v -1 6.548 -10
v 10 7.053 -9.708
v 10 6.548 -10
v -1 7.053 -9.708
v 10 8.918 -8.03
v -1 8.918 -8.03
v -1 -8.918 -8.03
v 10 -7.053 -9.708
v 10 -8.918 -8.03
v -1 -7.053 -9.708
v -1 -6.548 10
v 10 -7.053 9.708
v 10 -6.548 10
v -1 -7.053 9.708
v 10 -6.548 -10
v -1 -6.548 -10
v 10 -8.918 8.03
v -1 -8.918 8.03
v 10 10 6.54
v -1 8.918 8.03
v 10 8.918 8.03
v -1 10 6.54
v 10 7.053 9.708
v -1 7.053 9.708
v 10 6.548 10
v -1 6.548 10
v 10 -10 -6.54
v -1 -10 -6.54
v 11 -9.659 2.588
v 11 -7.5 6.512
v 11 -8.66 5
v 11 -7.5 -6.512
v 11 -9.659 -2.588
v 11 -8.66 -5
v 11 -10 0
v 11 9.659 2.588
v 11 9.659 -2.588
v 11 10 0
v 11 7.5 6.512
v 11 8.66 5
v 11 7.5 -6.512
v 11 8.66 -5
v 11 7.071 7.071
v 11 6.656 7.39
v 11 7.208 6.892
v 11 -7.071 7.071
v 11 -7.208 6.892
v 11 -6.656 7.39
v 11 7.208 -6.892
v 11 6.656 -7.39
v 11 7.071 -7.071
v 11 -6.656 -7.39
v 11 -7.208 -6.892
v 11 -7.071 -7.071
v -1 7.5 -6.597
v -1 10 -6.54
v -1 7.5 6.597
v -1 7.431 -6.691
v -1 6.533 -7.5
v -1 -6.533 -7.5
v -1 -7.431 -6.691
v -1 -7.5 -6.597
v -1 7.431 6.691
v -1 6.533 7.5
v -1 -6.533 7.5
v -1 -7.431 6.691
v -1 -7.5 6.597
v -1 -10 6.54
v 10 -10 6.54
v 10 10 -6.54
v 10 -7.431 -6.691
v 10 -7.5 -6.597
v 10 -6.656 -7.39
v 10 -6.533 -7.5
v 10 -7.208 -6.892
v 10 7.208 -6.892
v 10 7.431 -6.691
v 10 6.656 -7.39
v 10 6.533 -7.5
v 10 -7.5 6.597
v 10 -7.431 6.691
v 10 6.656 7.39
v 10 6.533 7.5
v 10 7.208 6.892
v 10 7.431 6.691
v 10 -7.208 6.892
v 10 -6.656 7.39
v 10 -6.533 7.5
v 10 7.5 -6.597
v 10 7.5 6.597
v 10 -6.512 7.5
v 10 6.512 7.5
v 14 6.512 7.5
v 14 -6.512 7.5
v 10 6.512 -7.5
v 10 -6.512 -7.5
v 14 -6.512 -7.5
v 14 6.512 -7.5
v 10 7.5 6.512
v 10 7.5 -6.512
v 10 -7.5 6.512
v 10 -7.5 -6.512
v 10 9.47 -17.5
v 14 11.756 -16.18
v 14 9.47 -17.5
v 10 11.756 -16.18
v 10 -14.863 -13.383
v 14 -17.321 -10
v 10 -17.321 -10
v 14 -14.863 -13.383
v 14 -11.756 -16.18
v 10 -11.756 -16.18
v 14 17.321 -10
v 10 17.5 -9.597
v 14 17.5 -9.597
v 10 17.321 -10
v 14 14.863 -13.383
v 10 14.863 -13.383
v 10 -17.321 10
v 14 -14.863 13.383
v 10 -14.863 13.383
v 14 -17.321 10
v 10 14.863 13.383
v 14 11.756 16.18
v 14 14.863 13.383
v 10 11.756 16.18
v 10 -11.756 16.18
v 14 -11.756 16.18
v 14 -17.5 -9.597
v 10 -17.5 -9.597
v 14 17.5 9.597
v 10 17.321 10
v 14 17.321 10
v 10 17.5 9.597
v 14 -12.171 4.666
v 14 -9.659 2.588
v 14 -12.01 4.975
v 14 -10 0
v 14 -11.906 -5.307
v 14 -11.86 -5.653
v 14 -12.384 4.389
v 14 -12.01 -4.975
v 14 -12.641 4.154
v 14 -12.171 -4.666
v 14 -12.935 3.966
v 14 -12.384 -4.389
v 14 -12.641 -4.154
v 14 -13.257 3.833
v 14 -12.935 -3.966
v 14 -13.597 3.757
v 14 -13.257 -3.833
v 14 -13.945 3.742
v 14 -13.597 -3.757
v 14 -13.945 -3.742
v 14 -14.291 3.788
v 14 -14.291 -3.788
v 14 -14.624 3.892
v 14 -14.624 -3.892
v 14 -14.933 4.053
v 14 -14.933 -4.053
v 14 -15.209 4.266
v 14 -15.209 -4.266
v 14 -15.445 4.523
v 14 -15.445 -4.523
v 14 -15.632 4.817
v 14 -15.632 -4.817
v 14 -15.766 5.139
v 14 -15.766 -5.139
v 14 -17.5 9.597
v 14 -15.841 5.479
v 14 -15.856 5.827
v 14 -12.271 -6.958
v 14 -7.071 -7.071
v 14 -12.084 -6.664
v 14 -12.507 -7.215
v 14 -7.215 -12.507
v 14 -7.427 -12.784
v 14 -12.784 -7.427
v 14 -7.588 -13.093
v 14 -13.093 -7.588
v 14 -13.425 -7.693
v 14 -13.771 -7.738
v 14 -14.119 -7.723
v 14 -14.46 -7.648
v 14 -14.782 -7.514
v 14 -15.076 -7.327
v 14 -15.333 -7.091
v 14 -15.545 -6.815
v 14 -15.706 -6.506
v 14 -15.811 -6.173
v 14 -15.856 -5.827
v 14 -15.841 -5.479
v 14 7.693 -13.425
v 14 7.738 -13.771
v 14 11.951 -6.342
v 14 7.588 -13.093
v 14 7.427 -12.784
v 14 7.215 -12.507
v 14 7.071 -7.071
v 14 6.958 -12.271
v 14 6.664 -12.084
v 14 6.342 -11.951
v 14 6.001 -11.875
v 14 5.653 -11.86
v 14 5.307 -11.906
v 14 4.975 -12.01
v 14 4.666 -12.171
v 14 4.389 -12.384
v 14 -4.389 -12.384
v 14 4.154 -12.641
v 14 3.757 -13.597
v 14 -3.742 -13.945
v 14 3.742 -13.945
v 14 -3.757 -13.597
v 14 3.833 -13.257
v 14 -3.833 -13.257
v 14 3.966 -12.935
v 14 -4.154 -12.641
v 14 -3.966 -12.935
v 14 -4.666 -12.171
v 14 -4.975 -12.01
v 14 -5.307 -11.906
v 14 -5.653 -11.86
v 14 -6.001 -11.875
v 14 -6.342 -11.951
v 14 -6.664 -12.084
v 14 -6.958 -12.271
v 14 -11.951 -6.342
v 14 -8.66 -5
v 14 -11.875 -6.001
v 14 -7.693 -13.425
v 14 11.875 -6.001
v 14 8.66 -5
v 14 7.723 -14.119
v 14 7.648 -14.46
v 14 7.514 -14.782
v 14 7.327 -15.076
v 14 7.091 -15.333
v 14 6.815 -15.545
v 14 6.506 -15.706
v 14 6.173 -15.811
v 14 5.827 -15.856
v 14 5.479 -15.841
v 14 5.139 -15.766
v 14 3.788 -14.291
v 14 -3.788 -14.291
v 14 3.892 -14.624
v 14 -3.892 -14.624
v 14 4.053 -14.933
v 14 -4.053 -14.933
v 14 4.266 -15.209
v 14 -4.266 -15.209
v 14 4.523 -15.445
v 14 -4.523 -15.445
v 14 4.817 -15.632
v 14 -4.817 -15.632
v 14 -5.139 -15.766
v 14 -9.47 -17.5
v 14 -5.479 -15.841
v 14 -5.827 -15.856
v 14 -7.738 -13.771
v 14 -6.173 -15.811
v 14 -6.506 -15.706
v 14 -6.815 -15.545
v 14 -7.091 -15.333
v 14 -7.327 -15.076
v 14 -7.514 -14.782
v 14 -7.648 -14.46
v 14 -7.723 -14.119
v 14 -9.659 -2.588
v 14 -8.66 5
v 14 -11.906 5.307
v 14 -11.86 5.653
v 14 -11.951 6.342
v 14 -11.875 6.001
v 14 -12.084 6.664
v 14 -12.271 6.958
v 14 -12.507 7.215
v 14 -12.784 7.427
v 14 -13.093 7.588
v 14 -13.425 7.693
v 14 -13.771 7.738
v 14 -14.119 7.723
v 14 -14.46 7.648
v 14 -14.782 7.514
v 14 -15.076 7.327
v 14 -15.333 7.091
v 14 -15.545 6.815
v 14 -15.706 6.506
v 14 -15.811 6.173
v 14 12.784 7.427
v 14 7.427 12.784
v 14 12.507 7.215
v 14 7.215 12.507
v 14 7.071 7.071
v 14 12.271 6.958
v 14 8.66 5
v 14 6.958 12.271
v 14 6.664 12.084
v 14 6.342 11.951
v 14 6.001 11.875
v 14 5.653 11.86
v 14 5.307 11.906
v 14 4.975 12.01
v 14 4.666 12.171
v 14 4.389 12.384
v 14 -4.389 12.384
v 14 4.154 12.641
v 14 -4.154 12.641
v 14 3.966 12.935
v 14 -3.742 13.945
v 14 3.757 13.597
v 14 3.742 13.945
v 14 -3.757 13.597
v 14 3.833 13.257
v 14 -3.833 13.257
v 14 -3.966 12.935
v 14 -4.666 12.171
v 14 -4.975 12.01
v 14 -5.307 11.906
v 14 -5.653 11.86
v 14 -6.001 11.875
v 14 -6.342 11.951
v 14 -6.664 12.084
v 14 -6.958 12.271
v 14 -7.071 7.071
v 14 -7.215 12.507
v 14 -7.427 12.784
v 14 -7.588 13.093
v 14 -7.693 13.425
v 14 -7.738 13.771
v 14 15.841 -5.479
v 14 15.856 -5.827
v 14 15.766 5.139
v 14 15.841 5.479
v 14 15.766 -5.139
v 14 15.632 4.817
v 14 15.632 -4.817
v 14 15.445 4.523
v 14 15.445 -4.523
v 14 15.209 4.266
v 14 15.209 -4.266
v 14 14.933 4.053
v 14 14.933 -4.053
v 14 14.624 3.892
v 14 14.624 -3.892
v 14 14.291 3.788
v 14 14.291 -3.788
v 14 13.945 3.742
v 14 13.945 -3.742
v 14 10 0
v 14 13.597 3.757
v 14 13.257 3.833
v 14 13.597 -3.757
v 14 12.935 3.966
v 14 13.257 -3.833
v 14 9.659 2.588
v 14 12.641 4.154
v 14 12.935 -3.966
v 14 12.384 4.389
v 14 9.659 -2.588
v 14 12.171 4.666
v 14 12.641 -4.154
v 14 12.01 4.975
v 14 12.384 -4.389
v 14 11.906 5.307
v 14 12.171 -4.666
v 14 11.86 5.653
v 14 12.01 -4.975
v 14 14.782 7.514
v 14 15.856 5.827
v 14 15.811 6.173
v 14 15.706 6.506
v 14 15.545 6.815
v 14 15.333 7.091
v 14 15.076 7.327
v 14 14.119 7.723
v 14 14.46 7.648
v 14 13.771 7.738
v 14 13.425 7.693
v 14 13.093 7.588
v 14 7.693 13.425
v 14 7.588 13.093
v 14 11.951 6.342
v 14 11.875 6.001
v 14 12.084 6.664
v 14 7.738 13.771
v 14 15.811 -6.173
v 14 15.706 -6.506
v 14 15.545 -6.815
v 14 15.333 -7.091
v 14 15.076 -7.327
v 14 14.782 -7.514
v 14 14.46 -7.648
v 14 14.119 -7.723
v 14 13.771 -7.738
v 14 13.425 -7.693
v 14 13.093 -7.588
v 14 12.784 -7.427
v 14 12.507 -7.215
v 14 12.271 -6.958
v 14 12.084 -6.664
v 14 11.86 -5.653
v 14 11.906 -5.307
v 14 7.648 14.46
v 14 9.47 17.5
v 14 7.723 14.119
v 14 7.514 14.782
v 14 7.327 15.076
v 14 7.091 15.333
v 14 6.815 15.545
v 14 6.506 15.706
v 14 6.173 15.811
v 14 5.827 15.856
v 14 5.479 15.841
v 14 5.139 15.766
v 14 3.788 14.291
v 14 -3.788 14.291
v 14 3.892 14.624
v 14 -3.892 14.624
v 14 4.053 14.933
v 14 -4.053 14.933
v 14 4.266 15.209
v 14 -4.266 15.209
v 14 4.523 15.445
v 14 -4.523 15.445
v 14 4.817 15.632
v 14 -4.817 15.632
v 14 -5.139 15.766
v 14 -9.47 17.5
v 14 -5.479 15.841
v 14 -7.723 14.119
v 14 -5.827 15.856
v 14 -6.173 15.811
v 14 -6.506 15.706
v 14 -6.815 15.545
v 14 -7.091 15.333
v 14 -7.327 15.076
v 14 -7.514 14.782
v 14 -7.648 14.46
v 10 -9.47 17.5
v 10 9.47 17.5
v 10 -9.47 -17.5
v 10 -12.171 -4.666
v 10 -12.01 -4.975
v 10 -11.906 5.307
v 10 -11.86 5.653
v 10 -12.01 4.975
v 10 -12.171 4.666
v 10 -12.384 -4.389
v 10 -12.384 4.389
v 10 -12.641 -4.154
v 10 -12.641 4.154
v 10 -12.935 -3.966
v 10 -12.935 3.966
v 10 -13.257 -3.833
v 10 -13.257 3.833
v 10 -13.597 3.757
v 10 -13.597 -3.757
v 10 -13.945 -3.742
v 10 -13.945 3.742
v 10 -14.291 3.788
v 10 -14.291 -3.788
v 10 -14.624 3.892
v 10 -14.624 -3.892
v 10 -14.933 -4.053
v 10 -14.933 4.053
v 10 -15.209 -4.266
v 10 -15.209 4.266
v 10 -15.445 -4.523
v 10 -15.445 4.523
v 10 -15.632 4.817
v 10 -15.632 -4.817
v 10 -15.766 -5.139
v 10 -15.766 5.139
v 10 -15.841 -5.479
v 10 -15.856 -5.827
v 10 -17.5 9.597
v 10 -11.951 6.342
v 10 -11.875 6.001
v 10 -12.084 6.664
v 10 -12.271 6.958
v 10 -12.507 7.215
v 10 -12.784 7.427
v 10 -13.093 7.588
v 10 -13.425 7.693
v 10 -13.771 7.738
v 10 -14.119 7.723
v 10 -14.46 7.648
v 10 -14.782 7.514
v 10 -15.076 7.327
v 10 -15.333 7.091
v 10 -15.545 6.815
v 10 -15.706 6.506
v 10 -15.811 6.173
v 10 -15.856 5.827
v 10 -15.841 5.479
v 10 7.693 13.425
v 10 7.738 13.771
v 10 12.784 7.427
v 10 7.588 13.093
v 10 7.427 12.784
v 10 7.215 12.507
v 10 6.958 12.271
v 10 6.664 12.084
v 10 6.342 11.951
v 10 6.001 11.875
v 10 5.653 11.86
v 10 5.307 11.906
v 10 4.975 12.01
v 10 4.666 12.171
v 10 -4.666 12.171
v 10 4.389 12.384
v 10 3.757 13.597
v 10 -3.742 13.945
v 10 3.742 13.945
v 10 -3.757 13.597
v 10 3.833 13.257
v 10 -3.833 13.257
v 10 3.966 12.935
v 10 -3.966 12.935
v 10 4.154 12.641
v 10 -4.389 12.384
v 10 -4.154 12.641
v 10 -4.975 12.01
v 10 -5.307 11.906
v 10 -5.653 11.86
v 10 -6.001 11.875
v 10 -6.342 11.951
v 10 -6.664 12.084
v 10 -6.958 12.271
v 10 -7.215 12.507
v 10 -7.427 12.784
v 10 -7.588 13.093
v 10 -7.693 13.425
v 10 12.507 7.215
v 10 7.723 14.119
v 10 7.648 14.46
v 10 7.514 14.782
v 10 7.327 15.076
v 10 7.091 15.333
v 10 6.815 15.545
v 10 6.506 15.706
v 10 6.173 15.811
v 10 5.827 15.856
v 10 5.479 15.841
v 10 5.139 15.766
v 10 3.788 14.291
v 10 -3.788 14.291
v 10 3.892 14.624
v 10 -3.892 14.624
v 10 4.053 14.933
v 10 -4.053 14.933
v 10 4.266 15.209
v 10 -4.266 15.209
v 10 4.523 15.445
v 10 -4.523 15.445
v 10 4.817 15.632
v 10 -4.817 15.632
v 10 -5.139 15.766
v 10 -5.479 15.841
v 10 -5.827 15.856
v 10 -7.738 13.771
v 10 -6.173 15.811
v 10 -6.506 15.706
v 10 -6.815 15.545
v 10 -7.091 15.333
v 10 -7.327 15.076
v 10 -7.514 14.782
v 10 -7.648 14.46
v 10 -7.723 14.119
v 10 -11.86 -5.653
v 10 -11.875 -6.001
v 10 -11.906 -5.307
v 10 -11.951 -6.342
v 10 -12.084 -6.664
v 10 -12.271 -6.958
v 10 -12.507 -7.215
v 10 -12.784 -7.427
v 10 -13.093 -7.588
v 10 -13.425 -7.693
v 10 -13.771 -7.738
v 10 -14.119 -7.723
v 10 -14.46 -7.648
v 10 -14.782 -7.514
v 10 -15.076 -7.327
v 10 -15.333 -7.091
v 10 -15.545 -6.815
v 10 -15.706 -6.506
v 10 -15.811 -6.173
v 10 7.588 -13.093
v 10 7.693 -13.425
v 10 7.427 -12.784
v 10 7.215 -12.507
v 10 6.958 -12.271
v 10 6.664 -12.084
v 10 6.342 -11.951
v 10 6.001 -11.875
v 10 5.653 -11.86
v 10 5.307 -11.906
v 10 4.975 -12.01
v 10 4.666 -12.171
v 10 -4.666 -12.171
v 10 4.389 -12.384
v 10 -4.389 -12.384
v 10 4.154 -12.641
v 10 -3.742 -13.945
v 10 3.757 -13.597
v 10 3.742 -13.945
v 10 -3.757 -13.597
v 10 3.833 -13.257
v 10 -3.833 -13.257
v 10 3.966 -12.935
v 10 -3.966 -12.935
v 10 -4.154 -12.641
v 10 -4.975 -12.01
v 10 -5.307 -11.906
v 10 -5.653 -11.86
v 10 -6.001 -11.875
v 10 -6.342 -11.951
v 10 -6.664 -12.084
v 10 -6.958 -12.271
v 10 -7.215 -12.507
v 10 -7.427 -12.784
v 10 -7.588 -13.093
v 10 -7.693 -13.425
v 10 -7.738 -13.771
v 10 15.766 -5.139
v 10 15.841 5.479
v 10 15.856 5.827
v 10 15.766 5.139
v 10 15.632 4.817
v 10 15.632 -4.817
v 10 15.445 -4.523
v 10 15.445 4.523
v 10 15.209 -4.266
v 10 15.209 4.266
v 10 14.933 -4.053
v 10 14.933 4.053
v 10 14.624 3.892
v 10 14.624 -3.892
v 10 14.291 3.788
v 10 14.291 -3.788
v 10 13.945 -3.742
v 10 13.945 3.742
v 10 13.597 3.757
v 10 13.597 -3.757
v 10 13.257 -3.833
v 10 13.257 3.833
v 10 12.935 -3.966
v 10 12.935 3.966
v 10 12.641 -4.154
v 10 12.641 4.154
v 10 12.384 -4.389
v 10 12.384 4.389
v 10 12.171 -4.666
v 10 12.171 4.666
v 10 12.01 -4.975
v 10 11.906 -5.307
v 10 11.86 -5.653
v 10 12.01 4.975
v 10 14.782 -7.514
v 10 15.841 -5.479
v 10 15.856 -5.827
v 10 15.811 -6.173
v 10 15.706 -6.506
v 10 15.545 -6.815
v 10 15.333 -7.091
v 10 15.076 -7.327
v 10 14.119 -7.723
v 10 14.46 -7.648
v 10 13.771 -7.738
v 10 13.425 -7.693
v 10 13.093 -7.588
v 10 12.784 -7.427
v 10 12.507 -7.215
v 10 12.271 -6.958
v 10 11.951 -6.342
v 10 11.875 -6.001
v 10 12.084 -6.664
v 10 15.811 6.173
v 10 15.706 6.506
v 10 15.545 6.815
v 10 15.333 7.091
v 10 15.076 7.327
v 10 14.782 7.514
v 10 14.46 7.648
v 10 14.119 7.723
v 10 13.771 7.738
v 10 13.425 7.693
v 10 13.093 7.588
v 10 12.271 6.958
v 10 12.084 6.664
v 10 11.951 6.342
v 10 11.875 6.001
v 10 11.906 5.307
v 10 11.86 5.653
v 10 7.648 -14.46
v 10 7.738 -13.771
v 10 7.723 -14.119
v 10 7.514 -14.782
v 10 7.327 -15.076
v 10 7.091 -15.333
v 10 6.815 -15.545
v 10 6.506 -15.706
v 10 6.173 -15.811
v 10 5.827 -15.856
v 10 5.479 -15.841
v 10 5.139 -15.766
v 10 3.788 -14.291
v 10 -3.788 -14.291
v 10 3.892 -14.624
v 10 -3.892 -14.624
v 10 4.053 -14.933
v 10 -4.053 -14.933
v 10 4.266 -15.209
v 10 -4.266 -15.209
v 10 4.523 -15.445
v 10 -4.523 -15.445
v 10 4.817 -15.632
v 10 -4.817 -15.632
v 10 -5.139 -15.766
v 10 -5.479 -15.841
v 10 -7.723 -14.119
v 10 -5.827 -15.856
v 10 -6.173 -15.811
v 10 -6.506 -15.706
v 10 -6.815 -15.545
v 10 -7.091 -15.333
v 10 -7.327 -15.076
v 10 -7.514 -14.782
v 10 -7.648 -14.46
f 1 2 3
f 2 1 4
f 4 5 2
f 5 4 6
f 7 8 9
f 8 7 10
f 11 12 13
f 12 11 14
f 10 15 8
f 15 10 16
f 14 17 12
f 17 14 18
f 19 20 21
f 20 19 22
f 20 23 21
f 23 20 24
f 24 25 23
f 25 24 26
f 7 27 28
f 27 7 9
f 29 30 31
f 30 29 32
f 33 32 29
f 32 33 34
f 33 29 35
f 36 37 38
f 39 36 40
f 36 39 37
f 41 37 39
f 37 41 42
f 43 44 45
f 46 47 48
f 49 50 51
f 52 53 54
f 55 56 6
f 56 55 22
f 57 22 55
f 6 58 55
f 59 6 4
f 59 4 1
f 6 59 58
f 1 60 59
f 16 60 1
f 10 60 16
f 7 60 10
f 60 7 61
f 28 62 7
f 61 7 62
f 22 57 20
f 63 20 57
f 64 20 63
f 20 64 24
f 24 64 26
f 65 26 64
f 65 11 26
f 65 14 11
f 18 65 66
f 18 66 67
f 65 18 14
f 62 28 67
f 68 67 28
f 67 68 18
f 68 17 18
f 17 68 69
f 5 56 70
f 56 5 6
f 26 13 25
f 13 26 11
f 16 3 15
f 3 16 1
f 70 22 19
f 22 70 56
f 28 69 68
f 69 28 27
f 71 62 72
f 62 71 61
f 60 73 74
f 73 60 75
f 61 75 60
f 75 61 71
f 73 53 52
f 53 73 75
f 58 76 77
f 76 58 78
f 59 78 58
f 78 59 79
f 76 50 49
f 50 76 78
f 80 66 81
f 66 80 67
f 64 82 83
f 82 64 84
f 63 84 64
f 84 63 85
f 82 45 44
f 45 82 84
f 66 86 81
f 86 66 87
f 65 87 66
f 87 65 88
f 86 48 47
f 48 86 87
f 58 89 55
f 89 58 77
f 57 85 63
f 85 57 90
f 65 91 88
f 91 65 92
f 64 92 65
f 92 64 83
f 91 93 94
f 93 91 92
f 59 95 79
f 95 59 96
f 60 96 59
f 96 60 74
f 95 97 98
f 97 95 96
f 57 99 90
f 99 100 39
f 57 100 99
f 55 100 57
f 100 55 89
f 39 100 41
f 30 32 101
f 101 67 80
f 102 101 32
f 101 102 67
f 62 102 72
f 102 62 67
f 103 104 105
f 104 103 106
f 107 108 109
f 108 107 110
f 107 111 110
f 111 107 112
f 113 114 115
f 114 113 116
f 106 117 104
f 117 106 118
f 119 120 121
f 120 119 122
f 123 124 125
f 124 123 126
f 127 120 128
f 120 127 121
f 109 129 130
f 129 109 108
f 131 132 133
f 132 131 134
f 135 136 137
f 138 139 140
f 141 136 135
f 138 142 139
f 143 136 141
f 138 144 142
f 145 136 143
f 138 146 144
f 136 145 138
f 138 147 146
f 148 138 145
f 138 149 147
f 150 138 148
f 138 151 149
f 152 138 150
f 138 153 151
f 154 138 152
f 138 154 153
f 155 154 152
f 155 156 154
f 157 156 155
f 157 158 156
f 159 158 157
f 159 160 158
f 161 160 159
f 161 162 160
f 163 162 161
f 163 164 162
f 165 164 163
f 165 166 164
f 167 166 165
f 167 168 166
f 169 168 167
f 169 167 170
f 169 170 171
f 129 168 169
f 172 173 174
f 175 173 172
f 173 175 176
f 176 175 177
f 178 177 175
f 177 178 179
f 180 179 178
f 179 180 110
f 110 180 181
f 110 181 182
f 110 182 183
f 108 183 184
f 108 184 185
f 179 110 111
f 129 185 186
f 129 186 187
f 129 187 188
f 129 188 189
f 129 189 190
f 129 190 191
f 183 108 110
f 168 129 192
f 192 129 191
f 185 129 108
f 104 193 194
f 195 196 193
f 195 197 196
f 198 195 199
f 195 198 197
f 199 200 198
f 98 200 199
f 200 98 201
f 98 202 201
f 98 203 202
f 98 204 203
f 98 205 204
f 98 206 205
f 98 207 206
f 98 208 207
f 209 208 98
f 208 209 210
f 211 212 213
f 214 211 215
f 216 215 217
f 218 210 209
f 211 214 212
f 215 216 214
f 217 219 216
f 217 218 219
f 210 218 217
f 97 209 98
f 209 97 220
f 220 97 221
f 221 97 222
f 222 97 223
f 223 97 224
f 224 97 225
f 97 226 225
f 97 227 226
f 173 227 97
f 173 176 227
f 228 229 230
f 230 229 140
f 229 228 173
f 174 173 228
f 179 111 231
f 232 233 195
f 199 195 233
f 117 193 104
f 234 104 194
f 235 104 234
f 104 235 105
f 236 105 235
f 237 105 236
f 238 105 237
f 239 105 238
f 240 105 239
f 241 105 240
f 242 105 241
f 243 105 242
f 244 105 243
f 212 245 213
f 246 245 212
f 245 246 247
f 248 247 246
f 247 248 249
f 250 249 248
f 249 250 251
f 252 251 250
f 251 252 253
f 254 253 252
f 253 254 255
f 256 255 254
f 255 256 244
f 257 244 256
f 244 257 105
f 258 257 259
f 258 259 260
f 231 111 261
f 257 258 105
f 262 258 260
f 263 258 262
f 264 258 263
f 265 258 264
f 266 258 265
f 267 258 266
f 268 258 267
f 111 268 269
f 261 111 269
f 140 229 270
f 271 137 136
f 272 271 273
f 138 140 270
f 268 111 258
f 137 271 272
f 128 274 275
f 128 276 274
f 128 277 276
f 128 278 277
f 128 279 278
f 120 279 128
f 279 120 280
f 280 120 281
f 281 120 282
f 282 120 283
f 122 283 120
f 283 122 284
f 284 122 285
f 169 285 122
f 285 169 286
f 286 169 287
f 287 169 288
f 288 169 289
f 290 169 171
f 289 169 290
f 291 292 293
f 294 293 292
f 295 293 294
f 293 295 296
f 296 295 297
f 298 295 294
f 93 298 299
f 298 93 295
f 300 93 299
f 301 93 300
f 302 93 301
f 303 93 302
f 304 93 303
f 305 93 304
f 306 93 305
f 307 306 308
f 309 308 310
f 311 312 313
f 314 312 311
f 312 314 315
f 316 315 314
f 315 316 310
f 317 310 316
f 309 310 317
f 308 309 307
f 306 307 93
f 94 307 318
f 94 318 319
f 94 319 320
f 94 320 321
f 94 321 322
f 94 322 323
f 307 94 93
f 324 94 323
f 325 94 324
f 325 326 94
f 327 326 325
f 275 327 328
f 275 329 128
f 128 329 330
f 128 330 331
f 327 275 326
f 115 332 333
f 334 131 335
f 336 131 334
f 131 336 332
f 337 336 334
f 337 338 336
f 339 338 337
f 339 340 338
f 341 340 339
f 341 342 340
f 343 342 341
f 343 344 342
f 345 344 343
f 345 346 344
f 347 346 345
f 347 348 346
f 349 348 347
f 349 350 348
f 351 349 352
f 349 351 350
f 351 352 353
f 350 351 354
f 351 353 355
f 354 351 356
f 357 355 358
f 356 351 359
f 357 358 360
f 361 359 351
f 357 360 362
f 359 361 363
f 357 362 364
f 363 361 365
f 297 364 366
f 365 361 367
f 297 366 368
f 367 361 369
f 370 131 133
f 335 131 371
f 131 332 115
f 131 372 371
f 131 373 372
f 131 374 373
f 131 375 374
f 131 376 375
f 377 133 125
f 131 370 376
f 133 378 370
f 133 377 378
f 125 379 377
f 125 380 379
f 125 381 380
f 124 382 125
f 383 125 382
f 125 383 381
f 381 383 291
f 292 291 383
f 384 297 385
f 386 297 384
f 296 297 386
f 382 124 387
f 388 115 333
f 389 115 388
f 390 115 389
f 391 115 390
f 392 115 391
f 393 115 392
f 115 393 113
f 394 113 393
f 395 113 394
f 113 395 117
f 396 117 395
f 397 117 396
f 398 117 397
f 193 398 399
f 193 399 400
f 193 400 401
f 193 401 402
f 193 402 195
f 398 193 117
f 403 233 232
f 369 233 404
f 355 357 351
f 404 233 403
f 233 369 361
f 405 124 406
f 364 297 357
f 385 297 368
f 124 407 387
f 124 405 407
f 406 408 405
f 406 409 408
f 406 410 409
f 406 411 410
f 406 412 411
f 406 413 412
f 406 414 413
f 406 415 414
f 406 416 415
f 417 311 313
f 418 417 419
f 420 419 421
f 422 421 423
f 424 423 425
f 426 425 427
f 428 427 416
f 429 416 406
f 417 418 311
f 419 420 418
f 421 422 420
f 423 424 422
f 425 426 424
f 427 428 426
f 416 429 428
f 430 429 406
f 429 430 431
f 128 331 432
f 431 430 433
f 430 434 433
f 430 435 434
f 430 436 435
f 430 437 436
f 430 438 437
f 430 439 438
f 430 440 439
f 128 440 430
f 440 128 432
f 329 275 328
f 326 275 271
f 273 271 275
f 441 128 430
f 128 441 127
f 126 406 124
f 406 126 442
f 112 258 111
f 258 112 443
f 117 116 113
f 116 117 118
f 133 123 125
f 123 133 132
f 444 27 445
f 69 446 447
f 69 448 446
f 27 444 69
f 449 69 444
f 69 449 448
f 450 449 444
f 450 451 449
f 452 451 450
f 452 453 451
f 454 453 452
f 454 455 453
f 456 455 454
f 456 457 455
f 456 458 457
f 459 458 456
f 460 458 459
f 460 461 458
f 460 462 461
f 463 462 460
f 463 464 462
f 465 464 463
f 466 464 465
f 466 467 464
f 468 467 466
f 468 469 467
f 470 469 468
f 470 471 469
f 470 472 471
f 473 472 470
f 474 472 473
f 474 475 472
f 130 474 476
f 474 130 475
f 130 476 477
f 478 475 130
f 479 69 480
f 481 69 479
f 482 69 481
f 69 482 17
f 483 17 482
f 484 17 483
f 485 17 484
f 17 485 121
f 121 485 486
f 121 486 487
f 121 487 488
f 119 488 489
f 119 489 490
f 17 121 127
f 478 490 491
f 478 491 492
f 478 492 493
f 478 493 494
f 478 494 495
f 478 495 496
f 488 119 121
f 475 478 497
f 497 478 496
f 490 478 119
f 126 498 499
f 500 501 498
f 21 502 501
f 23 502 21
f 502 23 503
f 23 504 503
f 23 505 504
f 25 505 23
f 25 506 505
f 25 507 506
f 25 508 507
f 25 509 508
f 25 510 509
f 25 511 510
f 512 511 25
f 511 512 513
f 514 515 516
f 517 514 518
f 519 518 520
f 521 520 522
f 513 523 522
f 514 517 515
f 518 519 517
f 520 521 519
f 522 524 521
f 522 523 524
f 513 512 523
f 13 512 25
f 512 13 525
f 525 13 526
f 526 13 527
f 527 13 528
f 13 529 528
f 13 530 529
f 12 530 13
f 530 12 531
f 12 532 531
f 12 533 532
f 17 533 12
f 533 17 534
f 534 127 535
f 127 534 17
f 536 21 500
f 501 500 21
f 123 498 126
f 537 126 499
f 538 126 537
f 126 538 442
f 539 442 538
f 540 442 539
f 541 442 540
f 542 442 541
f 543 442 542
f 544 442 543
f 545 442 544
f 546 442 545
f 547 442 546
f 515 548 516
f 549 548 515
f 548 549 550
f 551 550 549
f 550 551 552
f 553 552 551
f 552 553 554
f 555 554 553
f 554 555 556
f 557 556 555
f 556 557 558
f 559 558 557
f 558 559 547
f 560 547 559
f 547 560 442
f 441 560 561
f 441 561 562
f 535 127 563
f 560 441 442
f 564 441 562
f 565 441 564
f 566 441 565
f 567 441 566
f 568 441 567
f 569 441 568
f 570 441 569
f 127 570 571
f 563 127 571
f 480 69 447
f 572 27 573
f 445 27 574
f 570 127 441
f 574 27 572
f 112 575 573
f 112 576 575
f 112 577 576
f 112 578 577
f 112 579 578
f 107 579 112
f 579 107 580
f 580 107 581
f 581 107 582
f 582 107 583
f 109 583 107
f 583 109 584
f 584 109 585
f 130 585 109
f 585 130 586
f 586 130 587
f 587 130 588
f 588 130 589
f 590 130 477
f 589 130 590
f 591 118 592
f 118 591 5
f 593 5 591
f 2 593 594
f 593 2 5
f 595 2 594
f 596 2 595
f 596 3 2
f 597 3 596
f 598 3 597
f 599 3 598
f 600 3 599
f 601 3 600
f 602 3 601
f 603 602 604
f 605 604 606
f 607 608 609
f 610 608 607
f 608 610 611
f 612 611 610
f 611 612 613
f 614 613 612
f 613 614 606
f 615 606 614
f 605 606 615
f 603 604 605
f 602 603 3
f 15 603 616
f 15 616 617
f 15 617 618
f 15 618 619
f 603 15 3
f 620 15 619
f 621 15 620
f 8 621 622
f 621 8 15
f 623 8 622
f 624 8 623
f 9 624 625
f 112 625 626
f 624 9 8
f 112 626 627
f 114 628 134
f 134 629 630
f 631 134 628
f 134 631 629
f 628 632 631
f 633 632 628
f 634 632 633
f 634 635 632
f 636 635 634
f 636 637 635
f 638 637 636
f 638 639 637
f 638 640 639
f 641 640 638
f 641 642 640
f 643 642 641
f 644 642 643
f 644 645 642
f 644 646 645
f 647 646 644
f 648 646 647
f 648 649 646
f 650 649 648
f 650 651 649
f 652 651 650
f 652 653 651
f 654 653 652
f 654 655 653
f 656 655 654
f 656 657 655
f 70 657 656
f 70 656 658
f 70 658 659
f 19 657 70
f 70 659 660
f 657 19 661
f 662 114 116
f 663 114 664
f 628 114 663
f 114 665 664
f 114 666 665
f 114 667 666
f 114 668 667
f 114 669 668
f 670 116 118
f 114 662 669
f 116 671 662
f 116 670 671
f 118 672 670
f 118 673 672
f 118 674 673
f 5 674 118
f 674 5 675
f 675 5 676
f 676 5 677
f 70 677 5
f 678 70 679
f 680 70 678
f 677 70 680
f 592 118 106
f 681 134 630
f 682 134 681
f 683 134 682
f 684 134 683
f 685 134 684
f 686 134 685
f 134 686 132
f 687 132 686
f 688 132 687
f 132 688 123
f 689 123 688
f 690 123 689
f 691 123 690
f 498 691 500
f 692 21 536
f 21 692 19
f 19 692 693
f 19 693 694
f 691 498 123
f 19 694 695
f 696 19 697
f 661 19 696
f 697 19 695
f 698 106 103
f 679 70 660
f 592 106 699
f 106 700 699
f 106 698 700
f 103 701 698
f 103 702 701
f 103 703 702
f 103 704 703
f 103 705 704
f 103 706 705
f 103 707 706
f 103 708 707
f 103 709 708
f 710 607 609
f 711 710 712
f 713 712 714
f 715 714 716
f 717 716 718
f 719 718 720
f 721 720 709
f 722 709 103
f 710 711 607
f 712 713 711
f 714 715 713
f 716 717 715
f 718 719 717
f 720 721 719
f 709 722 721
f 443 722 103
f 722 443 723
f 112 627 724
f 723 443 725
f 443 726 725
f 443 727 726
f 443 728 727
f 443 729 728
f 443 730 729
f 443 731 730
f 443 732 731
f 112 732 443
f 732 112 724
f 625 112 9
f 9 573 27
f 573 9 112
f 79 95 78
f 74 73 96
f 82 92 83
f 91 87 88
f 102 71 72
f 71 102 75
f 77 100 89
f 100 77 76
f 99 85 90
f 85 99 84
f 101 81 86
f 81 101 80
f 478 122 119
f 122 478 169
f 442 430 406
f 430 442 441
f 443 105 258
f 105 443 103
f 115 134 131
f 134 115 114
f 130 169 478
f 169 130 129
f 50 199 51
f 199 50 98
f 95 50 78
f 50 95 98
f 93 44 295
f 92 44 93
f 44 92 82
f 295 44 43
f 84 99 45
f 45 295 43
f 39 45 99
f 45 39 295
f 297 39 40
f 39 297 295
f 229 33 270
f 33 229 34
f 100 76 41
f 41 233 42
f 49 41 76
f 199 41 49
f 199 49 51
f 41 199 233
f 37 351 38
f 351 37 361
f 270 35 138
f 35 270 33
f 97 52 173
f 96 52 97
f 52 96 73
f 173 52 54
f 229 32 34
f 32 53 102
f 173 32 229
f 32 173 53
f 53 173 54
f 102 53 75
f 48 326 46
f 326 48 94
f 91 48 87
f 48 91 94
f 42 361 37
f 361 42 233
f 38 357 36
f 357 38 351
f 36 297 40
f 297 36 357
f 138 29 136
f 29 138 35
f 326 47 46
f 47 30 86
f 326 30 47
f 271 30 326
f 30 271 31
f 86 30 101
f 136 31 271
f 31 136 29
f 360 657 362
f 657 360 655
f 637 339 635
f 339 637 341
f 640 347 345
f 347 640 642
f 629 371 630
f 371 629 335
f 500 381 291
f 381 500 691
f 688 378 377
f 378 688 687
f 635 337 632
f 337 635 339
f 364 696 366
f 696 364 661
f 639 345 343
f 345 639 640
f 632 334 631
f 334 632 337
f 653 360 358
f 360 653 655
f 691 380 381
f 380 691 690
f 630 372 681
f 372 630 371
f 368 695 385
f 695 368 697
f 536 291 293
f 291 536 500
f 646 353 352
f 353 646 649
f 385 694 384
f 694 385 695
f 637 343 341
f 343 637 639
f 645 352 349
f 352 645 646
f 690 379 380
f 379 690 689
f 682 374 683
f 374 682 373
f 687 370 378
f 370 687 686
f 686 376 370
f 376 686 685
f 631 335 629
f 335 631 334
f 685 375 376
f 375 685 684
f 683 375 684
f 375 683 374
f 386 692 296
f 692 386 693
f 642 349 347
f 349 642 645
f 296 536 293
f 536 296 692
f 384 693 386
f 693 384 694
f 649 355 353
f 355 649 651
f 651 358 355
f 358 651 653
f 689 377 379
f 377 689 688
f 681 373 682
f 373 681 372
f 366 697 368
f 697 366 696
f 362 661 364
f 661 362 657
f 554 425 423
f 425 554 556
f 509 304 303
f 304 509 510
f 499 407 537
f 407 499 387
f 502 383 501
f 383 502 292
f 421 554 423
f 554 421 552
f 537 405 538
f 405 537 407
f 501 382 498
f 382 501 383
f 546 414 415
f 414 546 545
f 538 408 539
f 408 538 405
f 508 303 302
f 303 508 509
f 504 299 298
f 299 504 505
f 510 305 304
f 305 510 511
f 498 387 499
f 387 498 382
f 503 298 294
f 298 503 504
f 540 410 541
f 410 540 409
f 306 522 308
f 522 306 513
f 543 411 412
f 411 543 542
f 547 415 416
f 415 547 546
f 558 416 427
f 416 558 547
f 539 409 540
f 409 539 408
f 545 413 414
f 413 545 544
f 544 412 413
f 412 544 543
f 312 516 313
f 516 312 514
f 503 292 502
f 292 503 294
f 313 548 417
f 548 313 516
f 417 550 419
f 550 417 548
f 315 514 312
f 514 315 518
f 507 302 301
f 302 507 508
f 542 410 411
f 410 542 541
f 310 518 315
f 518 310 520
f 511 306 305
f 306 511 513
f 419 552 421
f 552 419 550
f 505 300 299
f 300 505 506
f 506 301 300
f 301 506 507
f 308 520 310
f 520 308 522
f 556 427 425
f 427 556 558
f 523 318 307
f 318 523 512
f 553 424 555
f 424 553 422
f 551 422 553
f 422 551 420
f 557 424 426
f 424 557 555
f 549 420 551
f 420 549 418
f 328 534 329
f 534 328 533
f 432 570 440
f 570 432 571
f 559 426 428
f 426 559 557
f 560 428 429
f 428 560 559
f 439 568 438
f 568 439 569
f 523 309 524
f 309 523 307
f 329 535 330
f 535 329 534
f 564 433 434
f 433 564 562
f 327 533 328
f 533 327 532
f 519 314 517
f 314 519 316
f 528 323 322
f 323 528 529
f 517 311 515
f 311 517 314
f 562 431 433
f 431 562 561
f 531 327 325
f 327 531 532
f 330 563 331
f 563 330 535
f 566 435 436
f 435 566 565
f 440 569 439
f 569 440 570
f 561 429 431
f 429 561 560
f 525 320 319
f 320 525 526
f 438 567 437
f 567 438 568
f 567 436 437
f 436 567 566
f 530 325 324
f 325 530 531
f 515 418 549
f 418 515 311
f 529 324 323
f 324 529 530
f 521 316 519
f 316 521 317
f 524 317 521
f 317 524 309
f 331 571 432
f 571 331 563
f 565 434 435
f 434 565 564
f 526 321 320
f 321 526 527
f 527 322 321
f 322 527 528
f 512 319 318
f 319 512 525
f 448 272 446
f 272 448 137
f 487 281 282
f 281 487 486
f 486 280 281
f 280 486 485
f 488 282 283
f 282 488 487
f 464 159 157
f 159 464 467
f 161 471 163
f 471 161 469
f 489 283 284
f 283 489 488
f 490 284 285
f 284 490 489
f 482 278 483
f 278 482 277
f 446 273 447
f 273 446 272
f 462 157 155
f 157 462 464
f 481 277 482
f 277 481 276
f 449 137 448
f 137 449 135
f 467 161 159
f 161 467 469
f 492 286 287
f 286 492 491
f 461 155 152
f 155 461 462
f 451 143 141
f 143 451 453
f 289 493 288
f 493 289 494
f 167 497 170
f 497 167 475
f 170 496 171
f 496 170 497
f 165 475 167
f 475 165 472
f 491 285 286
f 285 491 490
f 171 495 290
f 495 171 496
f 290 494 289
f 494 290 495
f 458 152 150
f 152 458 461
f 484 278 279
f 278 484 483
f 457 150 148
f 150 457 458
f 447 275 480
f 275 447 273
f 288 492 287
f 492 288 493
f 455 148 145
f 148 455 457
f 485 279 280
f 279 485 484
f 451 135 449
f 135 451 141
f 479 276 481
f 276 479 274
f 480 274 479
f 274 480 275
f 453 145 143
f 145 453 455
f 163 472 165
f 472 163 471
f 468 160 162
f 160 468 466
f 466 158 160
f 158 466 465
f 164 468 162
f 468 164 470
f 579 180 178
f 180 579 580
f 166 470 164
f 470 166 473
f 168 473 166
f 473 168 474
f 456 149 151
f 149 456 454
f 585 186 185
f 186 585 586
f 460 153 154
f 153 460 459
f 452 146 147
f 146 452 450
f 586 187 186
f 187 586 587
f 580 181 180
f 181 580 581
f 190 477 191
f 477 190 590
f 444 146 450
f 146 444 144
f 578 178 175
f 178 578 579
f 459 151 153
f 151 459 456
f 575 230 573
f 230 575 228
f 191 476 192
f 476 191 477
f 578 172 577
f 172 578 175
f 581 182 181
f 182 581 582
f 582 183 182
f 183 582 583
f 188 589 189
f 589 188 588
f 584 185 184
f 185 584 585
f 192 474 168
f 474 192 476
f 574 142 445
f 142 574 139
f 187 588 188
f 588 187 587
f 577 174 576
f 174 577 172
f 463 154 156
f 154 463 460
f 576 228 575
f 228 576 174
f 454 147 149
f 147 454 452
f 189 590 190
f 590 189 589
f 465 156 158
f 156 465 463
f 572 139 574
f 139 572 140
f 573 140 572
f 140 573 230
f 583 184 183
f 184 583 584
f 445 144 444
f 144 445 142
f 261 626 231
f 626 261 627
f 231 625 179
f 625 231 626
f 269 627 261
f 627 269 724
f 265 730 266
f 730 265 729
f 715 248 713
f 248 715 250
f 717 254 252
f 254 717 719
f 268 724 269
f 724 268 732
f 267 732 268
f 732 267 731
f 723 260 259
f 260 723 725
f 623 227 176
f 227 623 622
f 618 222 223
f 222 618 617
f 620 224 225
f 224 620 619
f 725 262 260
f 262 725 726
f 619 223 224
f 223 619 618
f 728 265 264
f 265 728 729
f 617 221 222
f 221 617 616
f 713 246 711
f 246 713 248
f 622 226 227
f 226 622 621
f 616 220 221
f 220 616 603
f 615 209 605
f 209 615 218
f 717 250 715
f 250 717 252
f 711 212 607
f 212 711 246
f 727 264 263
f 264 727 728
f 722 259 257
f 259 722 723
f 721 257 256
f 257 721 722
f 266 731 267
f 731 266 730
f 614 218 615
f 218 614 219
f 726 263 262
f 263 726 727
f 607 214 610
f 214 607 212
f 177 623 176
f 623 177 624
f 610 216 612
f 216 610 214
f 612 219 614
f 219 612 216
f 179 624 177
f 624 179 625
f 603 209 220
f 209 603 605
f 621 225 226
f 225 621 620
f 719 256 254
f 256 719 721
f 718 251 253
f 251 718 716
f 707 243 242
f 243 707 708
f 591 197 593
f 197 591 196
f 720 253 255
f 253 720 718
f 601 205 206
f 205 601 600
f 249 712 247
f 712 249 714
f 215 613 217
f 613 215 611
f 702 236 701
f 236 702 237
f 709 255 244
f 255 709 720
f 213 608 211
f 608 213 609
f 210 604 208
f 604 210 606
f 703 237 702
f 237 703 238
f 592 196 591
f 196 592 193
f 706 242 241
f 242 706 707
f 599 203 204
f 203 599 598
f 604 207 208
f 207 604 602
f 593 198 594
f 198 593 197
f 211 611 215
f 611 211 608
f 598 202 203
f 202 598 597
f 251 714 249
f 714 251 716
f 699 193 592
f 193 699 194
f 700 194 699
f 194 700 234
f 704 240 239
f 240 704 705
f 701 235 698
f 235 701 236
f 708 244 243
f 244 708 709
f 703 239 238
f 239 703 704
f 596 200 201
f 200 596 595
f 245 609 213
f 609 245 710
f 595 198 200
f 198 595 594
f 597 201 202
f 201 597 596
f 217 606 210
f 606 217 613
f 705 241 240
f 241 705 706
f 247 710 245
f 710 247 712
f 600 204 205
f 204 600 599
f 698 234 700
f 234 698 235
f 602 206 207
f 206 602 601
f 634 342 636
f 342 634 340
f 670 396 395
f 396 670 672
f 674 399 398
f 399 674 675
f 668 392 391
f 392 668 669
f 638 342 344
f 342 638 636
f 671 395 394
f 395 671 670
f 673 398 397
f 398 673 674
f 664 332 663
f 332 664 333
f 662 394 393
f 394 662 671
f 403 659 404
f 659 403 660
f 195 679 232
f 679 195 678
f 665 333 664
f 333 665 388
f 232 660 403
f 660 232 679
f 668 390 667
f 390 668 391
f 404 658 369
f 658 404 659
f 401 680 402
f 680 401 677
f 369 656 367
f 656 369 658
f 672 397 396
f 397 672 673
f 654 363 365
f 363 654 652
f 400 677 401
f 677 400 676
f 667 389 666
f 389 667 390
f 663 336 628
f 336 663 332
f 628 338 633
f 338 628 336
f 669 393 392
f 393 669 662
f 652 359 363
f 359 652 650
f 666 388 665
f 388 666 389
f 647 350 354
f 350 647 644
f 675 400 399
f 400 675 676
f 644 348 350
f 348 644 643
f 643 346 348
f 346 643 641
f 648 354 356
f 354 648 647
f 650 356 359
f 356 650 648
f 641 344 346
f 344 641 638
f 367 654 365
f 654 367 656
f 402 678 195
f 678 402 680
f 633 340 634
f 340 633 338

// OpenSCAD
module flangeBody(){
	difference(){
		//tubeBody
		intersection(){
			translate([5,0,0]) rotate([0,90,0]) cylinder(h=12,r=12,center=true);
			translate([5,0,0]) cube(size=[20,20,20],center=true);
		}
		//throat
		intersection(){
			translate([5,0,0]) rotate([0,90,0]) cylinder(h=13,r=10,center=true);
			translate([5,0,0]) cube(size=[15,15,15],center=true);
		}
	}
}

module flangeFace(){
	difference(){
		union(){
			difference(){
				//flange
				intersection(){
					translate([12,0,0]) rotate([0,90,0]) cylinder(r=20,h=4,center=true);
					translate([12,0,0]) cube(size=[10,35,35],center=true);
				}
				//flangeThroat
				intersection(){
					translate([12,0,0]) rotate([0,90,0]) cylinder(r=10,h=5,$fn=24,center=true);
					translate([12,0,0]) cube(size=[10,20,15],center=true);
				}
			}
		}
		//tubeMountingHoles
		rotate([22.5,0,0]){
			for ( v = [0 : 8] ){
				rotate( v * 360 / 8, [1, 0, 0]){
					translate([12, 15, 0]){
						rotate([0,90,0]){
							cylinder(r=2,h=5,$fn=36,center=true);
						}
					}
				}
			}
		}
	}
}

module flange(){
	union(){
		flangeBody();
		flangeFace();
	}
}

flange();
